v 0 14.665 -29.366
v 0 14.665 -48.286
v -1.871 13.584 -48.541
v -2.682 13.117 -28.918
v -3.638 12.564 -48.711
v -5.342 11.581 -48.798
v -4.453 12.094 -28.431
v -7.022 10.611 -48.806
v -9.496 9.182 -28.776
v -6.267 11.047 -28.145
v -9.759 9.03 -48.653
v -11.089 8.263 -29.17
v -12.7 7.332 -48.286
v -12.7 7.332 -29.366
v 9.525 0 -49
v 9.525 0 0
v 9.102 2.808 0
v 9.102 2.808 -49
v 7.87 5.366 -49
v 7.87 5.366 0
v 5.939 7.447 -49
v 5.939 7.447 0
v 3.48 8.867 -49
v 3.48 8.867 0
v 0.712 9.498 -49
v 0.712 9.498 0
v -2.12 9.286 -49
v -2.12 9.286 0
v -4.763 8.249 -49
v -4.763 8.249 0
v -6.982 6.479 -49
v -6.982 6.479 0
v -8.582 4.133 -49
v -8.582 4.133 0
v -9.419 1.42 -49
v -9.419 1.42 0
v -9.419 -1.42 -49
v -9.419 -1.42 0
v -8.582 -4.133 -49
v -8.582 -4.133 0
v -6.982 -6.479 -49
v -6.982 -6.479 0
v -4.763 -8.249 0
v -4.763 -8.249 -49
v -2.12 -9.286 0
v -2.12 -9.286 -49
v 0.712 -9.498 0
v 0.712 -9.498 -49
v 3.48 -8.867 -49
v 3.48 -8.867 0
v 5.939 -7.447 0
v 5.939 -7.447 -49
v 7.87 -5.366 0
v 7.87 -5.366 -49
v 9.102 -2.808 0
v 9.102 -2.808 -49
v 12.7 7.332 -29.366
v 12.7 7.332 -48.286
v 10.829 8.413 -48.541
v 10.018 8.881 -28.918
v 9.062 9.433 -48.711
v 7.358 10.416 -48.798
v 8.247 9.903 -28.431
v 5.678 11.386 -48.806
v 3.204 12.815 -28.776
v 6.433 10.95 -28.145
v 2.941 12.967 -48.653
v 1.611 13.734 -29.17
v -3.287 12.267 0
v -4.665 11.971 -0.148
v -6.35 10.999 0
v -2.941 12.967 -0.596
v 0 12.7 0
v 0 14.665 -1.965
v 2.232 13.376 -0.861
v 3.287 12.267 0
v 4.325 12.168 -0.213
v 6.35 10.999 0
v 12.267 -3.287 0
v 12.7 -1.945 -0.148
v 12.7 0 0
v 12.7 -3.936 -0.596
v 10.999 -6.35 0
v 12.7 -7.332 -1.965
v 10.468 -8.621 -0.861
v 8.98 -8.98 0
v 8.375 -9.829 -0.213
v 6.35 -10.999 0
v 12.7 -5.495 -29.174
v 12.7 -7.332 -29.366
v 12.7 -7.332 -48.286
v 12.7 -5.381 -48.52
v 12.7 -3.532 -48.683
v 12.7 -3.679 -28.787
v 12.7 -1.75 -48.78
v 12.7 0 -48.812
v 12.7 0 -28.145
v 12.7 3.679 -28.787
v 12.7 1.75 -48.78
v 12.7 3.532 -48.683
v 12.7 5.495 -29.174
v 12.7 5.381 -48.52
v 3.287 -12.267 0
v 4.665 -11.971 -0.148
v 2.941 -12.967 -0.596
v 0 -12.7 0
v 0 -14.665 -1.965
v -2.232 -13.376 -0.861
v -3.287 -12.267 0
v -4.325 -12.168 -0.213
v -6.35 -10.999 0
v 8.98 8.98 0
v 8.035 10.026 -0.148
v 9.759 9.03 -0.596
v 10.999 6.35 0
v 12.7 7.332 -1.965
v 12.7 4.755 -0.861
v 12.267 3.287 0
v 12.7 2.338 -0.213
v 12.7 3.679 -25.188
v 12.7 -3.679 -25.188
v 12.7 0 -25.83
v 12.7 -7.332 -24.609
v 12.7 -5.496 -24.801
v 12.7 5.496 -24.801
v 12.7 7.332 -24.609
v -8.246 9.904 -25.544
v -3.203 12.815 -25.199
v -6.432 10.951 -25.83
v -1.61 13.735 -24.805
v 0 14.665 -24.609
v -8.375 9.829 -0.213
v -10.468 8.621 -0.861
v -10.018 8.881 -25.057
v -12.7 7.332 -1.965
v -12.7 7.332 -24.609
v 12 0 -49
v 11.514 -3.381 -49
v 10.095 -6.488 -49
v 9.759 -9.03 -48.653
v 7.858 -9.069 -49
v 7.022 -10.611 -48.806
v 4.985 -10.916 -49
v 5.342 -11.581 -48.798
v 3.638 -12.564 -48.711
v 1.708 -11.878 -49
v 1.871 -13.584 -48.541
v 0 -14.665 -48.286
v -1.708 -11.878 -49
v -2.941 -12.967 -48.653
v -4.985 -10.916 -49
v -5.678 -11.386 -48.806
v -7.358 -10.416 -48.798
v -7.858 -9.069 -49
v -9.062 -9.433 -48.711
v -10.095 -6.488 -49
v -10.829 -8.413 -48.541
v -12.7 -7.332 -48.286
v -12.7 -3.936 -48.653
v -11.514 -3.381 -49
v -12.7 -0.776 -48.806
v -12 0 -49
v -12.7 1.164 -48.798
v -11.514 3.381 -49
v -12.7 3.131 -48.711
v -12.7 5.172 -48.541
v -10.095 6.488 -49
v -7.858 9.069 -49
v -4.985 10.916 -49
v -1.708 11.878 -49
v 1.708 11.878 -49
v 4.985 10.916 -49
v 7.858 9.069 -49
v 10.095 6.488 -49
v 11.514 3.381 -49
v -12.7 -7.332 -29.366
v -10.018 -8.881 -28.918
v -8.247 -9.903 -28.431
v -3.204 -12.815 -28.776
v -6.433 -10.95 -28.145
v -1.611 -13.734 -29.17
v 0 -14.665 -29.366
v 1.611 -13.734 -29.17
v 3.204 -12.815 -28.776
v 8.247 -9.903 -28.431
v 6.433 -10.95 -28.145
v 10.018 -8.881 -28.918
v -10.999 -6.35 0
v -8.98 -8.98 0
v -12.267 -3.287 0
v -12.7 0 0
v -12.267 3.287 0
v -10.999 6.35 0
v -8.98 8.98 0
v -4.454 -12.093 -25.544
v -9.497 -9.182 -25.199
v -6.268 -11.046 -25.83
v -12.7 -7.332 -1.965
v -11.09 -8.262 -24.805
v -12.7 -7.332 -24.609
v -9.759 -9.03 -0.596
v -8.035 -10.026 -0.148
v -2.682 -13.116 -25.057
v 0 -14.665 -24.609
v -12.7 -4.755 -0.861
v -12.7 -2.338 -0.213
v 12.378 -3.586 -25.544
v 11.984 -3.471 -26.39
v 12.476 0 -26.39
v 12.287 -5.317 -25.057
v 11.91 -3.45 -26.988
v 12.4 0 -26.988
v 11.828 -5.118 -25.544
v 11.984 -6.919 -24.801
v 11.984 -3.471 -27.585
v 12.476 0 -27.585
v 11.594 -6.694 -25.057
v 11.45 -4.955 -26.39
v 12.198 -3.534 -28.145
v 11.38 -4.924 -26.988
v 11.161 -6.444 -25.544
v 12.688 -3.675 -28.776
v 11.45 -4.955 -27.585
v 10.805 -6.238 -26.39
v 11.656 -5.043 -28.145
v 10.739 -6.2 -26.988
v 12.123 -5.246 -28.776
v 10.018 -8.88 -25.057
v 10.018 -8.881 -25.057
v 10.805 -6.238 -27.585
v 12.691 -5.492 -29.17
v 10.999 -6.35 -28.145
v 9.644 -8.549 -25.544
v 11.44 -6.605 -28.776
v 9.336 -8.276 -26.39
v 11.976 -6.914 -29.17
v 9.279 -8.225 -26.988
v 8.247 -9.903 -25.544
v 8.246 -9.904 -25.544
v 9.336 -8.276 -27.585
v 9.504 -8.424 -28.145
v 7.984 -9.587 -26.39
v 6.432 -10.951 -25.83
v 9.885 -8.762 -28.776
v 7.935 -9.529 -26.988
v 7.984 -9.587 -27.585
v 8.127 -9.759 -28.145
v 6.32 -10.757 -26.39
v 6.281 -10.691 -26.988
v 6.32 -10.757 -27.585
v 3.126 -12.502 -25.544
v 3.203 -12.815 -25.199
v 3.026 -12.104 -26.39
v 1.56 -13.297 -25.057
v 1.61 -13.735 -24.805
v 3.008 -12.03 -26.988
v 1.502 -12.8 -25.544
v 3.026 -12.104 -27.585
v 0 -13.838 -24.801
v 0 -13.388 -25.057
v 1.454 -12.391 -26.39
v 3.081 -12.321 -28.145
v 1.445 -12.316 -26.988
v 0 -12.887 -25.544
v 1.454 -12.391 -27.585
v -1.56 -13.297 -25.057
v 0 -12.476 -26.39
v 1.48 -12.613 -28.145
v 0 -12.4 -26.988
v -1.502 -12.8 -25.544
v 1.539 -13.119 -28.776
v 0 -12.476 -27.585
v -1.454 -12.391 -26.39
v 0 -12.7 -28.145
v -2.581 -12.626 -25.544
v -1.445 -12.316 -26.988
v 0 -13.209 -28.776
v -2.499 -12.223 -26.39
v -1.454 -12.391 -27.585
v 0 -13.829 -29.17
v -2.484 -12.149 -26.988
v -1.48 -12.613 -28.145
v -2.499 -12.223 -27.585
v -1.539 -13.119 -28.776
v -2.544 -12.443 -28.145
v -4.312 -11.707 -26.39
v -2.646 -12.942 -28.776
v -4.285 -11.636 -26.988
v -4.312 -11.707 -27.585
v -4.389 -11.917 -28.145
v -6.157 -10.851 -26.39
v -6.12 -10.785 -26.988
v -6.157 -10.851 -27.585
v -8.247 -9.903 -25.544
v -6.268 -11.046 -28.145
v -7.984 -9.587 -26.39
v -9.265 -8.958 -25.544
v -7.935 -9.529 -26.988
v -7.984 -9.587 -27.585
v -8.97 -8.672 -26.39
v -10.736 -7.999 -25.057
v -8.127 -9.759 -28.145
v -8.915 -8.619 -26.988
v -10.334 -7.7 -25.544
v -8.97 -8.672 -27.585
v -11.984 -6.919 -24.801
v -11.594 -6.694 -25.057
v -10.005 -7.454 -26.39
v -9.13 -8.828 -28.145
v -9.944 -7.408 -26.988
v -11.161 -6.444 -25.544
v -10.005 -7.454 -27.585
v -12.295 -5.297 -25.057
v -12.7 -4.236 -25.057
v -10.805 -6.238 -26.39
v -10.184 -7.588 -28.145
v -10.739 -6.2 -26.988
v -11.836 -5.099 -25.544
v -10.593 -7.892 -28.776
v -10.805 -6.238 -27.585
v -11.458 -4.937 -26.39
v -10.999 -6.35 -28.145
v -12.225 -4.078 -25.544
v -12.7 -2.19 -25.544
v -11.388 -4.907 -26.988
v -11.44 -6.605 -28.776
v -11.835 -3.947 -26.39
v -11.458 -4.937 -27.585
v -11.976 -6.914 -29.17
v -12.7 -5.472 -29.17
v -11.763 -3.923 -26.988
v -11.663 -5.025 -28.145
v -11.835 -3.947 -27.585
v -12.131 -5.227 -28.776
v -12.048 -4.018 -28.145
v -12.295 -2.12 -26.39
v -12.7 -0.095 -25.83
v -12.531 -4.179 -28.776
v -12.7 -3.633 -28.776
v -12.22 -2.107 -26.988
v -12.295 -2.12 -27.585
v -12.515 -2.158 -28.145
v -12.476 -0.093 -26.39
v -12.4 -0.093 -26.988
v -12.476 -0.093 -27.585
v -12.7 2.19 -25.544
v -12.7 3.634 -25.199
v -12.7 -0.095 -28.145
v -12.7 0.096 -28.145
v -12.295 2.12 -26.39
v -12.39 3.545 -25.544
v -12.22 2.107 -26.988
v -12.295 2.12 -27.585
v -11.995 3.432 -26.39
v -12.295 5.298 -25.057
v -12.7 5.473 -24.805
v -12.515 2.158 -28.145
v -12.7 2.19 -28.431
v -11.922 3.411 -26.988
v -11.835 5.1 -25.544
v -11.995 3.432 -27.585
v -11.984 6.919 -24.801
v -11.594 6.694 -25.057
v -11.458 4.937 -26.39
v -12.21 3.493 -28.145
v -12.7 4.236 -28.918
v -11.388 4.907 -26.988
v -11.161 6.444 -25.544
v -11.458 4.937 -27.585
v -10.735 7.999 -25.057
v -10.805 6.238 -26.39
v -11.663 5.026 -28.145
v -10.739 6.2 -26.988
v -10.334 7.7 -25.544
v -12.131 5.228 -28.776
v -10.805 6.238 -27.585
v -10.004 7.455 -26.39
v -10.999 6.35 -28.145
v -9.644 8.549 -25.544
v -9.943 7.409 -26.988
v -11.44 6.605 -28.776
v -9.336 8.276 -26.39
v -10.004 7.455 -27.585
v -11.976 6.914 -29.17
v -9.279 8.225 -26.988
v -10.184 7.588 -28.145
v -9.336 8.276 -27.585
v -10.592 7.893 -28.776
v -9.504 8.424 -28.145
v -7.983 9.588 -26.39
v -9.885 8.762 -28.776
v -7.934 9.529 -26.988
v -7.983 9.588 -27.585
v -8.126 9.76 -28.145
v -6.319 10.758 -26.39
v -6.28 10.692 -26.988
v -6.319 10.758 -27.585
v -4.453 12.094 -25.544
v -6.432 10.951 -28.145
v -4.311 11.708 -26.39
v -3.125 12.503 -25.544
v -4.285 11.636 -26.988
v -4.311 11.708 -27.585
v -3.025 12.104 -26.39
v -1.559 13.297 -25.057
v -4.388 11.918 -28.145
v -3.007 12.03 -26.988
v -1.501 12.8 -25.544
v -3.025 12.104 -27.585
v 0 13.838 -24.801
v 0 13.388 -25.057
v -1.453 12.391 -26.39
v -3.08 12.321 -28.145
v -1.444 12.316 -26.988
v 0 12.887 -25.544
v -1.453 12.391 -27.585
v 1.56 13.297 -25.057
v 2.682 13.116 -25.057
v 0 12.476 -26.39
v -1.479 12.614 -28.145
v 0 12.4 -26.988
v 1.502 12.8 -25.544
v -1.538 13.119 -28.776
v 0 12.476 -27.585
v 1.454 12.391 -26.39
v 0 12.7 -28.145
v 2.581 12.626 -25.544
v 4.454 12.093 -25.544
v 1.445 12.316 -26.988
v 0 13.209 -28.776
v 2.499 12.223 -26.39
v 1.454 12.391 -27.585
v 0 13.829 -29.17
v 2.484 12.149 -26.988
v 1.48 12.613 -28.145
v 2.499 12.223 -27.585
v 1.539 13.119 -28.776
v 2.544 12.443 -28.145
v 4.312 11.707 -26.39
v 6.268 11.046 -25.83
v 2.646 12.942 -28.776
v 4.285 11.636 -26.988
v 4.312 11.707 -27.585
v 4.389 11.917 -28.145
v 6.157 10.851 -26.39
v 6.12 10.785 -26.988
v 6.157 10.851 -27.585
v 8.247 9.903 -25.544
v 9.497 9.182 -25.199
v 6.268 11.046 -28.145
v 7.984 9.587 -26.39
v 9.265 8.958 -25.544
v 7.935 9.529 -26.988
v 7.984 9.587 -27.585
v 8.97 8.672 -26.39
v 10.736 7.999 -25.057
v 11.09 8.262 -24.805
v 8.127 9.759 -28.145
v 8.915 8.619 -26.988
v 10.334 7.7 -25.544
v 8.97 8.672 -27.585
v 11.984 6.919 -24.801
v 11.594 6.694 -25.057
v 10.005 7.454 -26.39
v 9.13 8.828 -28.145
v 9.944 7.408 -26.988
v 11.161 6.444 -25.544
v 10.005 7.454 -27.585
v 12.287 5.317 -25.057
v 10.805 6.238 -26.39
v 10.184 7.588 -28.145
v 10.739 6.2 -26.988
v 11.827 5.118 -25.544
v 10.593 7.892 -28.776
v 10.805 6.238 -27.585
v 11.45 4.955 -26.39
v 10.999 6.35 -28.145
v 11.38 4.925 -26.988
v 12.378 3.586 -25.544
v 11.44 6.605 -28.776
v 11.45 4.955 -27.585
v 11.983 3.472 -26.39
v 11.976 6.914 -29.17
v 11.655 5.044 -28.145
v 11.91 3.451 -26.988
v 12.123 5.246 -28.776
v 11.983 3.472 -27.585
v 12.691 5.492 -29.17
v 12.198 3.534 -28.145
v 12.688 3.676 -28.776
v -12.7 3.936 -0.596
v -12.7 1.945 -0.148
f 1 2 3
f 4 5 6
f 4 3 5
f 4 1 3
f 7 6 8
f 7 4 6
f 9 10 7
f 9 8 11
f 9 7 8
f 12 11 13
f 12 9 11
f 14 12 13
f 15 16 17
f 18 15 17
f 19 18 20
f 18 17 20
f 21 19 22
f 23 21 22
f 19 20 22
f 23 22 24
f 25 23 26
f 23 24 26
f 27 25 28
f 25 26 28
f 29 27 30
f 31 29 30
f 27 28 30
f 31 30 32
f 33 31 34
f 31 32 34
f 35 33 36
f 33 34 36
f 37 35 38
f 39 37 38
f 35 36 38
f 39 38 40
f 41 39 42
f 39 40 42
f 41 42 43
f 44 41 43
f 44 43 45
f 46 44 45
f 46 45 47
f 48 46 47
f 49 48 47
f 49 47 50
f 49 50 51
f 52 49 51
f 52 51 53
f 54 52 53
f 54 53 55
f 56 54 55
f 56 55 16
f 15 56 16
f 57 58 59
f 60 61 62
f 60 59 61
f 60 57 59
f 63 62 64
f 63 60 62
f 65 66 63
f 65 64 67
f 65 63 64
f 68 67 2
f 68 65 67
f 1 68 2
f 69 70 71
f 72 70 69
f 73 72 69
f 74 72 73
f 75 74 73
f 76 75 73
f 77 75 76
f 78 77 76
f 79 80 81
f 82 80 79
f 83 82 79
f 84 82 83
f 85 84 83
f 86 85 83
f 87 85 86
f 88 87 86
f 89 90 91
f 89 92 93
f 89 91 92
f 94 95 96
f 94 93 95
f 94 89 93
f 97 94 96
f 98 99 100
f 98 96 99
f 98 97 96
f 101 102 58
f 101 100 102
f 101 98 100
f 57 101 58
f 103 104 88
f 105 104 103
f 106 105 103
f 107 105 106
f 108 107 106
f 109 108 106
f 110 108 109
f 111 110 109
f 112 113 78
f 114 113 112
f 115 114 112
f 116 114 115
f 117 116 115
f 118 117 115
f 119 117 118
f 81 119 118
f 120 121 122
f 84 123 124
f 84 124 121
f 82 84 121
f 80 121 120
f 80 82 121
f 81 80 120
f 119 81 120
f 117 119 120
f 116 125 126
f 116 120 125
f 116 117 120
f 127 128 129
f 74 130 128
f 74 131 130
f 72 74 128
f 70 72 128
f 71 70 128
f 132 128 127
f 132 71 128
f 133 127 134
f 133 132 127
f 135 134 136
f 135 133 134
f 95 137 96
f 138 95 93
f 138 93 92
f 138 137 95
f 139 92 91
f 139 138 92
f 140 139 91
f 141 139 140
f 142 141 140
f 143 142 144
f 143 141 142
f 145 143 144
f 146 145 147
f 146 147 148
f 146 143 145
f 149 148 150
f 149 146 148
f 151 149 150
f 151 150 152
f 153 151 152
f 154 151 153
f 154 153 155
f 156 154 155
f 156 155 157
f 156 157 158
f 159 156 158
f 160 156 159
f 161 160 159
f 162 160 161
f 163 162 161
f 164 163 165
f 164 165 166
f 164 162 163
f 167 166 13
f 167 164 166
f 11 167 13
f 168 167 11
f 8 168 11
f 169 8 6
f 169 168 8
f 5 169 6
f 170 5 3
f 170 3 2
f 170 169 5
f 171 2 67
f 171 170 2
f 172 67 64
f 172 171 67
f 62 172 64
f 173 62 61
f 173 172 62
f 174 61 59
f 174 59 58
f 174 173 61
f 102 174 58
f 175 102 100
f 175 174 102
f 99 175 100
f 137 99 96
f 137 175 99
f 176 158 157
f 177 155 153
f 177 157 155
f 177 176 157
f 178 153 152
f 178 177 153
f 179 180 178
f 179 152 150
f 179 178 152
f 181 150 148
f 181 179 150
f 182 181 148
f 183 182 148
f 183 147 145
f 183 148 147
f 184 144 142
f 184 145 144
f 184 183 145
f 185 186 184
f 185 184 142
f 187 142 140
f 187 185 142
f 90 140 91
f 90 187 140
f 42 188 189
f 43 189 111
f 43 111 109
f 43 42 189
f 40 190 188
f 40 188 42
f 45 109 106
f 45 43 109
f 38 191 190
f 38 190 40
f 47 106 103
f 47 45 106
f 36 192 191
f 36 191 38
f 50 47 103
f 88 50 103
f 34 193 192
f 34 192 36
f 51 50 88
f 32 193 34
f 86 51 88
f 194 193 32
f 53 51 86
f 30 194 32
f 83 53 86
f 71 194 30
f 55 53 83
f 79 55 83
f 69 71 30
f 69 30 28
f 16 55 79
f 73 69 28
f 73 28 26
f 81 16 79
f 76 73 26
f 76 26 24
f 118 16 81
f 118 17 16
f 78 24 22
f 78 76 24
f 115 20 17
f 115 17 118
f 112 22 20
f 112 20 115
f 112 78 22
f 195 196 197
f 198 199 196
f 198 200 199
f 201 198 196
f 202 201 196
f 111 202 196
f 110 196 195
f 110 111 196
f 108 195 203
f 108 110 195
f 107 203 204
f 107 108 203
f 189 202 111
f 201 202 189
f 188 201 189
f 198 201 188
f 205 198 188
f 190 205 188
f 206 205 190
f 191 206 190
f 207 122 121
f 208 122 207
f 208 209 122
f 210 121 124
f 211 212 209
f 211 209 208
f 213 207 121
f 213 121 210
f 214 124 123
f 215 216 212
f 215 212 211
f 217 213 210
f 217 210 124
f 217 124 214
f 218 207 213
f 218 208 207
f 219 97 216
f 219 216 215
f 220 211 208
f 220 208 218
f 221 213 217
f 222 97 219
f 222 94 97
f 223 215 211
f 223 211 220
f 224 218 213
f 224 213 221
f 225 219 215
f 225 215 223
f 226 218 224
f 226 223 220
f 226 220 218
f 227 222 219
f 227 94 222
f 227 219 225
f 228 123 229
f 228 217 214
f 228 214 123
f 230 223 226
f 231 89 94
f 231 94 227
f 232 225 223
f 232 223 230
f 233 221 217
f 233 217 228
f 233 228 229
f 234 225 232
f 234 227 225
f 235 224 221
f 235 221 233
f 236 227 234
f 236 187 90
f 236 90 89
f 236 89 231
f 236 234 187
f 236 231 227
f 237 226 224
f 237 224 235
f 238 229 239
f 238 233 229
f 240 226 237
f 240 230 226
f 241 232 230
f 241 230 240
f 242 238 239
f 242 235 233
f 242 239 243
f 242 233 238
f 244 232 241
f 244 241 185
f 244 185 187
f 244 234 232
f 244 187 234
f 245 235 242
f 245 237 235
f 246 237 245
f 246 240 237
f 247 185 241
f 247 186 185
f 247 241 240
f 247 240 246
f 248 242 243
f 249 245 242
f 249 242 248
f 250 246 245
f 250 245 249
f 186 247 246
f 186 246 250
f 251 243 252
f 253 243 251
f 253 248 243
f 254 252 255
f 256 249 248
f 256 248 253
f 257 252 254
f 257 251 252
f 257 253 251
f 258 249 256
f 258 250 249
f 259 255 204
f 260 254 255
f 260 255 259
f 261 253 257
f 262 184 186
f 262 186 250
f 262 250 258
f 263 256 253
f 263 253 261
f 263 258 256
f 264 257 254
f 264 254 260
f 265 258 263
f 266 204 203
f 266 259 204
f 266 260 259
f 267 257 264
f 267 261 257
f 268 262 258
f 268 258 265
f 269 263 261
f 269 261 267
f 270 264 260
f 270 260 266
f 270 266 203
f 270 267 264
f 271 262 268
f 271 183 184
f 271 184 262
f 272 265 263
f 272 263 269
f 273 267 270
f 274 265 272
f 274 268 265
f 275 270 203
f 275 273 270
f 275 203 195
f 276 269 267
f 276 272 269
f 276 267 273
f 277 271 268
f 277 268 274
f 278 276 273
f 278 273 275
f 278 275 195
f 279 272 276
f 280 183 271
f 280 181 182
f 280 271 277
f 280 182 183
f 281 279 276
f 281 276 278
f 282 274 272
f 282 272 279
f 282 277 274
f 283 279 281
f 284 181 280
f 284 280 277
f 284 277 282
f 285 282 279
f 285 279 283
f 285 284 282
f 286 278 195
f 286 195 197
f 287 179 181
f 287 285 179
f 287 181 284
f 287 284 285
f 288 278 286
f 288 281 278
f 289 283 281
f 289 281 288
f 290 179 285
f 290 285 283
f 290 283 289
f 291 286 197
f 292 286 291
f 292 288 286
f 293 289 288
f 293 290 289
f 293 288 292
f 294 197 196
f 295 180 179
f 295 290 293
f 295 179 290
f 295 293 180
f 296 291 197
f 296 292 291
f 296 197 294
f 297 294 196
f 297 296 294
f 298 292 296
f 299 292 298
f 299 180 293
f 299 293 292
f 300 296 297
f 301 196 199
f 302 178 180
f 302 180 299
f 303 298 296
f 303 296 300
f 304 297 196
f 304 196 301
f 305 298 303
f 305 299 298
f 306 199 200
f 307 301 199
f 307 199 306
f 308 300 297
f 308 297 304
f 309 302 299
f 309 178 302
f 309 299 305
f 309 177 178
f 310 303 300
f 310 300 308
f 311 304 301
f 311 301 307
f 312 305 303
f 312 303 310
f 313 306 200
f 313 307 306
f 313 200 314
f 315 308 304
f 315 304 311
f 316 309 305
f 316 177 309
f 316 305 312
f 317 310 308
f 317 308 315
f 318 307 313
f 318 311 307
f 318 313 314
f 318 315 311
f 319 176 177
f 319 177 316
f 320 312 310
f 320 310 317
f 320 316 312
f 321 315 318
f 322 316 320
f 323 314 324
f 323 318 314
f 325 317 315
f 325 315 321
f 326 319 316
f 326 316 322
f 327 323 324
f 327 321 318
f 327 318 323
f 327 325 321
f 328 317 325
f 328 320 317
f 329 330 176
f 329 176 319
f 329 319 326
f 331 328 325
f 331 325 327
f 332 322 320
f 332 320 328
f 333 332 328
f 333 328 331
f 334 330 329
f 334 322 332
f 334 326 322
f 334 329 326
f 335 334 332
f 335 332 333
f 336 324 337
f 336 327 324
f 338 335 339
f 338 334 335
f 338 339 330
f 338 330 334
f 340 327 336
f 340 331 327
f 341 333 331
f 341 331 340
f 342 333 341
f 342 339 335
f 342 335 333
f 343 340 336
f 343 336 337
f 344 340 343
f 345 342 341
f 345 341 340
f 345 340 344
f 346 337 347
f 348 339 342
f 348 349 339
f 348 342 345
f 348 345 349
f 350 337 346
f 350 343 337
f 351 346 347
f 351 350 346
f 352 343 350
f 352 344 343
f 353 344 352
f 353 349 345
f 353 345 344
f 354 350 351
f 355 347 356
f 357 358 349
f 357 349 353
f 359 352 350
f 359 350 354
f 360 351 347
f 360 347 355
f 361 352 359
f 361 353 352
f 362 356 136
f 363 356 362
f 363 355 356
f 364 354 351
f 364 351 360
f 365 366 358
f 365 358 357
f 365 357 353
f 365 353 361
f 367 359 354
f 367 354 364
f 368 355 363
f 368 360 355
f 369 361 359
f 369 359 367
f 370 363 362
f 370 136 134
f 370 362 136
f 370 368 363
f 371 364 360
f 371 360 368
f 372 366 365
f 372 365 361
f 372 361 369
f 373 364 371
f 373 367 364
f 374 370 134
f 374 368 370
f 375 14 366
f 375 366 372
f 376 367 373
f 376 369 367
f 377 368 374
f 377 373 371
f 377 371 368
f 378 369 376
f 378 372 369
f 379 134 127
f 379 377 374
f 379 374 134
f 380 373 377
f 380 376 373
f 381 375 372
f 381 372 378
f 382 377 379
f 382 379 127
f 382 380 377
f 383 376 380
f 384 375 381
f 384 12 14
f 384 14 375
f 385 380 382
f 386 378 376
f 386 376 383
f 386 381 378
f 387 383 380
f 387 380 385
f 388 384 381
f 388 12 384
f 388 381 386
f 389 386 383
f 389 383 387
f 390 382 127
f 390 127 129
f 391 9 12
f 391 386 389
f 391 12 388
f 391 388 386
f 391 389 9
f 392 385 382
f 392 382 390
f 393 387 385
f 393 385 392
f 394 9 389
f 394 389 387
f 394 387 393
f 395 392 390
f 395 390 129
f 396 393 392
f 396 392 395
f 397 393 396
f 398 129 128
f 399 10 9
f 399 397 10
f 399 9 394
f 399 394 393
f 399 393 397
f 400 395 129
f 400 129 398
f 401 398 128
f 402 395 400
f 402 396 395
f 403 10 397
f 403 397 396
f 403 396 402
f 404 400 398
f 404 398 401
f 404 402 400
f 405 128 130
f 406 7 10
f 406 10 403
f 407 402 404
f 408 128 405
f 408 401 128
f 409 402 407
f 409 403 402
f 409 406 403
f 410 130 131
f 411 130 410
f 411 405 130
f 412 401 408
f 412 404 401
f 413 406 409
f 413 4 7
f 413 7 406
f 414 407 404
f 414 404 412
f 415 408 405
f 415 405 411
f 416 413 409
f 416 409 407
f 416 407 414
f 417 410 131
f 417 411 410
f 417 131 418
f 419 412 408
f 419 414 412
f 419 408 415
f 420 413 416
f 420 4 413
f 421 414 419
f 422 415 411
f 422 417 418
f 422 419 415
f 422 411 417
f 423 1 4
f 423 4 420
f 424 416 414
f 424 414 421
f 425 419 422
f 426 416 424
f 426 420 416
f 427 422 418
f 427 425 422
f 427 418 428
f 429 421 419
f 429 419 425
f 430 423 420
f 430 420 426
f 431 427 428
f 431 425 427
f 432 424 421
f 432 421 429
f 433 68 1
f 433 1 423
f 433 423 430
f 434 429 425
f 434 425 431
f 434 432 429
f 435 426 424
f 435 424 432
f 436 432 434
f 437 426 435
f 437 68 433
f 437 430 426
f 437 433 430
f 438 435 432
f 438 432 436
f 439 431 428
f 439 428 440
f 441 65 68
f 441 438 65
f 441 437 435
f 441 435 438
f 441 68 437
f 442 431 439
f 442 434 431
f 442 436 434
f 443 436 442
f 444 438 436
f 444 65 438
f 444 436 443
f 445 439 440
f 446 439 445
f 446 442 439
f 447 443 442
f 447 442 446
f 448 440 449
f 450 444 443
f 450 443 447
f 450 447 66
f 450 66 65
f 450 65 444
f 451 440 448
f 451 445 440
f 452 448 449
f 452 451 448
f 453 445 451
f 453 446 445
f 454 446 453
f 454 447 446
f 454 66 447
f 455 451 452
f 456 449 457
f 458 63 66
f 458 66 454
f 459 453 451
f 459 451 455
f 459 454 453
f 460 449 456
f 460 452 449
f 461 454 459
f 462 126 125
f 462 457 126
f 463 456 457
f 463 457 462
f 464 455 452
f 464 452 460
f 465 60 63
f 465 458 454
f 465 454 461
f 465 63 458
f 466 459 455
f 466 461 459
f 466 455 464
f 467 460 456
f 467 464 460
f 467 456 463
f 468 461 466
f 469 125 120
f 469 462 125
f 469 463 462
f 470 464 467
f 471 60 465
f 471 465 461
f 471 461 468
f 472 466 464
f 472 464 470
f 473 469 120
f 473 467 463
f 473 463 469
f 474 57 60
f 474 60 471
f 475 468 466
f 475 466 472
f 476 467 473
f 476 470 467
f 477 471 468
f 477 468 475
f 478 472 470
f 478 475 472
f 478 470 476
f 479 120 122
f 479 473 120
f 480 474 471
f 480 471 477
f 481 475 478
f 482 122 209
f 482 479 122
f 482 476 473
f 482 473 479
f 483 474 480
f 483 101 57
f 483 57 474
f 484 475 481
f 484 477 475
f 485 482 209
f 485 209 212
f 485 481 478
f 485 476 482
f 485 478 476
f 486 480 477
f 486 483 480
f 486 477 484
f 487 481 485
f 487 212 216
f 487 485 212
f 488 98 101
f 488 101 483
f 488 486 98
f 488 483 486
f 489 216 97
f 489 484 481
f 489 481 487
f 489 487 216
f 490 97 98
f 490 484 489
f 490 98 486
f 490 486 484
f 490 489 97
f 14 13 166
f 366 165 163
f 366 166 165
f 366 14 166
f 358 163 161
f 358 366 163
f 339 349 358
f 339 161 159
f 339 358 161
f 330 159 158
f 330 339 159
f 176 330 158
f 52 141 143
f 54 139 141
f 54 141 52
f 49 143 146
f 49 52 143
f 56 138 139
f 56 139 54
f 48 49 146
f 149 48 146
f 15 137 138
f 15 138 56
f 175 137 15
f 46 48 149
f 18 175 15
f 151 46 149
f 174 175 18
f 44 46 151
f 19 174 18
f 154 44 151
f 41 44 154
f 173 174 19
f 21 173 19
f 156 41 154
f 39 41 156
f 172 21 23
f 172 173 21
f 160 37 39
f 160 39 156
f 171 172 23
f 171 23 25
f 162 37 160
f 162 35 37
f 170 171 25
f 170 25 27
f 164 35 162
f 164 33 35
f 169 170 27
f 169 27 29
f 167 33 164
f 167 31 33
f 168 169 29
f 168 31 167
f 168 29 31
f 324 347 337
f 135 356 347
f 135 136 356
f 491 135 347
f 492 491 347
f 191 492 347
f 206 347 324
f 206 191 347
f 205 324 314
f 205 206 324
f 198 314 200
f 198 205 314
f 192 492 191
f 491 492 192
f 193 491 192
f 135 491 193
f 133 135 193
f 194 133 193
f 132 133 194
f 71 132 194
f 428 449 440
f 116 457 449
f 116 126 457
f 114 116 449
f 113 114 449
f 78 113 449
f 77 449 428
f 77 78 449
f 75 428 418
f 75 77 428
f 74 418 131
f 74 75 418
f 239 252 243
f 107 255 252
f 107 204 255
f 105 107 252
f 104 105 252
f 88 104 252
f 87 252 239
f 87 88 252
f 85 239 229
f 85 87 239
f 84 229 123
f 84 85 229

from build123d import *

# Parameters (mm, degrees)
SKETCH1_R          = 9.525
EXTRUDE1_DEPTH     = 59
SKETCH2_R          = 2.38125
SKETCH3_W          = 35.382303839
SKETCH3_H          = 29.228859692
CUT_EXTRUDE1_DEPTH = 10


with BuildPart() as part:
    # Sketch1 → Extrude1 (new body)
    with BuildSketch(Plane.XY):
        Polygon((-12.7, 7.332348419), (-12.7, -7.332348419), (0, -14.664696837), (12.7, -7.332348419), (12.7, 7.332348419), (0, 14.664696837), align=None)
        Circle(SKETCH1_R, mode=Mode.SUBTRACT)
    extrude(amount=-EXTRUDE1_DEPTH)

    # Sketch2 → Cut-Revolve3 (revolve, cut)
    with BuildSketch(Plane(origin=(0, 0, 0), x_dir=(0, 0, -1), z_dir=(1, 0, 0)), mode=Mode.PRIVATE) as cut_revolve3_sk:
        Polygon((59, 14.664696837), (48.285996634, 14.664696837), (49, 12), (59, 12), align=None)
        Polygon((1.964696837, 14.664696837), (0, 14.664696837), (0, 12.7), align=None)
        with Locations((26.9875, 14.78125)):
            Circle(SKETCH2_R)
    revolve(cut_revolve3_sk.sketch.rotate(Axis((0, 0, 0), (0, 0, -1)), 90), axis=Axis((0, 0, 0), (0, 0, -1)), mode=Mode.SUBTRACT)

    # Sketch3 → Cut-Extrude1 (cut)
    with BuildSketch(Plane(origin=(0, 0, -59), x_dir=(-1, 0, 0), z_dir=(0, 0, -1))):
        with Locations((2.307541554, -0.133770525)):
            Rectangle(SKETCH3_W, SKETCH3_H)
    extrude(amount=-CUT_EXTRUDE1_DEPTH, mode=Mode.SUBTRACT)


solid = part.part
